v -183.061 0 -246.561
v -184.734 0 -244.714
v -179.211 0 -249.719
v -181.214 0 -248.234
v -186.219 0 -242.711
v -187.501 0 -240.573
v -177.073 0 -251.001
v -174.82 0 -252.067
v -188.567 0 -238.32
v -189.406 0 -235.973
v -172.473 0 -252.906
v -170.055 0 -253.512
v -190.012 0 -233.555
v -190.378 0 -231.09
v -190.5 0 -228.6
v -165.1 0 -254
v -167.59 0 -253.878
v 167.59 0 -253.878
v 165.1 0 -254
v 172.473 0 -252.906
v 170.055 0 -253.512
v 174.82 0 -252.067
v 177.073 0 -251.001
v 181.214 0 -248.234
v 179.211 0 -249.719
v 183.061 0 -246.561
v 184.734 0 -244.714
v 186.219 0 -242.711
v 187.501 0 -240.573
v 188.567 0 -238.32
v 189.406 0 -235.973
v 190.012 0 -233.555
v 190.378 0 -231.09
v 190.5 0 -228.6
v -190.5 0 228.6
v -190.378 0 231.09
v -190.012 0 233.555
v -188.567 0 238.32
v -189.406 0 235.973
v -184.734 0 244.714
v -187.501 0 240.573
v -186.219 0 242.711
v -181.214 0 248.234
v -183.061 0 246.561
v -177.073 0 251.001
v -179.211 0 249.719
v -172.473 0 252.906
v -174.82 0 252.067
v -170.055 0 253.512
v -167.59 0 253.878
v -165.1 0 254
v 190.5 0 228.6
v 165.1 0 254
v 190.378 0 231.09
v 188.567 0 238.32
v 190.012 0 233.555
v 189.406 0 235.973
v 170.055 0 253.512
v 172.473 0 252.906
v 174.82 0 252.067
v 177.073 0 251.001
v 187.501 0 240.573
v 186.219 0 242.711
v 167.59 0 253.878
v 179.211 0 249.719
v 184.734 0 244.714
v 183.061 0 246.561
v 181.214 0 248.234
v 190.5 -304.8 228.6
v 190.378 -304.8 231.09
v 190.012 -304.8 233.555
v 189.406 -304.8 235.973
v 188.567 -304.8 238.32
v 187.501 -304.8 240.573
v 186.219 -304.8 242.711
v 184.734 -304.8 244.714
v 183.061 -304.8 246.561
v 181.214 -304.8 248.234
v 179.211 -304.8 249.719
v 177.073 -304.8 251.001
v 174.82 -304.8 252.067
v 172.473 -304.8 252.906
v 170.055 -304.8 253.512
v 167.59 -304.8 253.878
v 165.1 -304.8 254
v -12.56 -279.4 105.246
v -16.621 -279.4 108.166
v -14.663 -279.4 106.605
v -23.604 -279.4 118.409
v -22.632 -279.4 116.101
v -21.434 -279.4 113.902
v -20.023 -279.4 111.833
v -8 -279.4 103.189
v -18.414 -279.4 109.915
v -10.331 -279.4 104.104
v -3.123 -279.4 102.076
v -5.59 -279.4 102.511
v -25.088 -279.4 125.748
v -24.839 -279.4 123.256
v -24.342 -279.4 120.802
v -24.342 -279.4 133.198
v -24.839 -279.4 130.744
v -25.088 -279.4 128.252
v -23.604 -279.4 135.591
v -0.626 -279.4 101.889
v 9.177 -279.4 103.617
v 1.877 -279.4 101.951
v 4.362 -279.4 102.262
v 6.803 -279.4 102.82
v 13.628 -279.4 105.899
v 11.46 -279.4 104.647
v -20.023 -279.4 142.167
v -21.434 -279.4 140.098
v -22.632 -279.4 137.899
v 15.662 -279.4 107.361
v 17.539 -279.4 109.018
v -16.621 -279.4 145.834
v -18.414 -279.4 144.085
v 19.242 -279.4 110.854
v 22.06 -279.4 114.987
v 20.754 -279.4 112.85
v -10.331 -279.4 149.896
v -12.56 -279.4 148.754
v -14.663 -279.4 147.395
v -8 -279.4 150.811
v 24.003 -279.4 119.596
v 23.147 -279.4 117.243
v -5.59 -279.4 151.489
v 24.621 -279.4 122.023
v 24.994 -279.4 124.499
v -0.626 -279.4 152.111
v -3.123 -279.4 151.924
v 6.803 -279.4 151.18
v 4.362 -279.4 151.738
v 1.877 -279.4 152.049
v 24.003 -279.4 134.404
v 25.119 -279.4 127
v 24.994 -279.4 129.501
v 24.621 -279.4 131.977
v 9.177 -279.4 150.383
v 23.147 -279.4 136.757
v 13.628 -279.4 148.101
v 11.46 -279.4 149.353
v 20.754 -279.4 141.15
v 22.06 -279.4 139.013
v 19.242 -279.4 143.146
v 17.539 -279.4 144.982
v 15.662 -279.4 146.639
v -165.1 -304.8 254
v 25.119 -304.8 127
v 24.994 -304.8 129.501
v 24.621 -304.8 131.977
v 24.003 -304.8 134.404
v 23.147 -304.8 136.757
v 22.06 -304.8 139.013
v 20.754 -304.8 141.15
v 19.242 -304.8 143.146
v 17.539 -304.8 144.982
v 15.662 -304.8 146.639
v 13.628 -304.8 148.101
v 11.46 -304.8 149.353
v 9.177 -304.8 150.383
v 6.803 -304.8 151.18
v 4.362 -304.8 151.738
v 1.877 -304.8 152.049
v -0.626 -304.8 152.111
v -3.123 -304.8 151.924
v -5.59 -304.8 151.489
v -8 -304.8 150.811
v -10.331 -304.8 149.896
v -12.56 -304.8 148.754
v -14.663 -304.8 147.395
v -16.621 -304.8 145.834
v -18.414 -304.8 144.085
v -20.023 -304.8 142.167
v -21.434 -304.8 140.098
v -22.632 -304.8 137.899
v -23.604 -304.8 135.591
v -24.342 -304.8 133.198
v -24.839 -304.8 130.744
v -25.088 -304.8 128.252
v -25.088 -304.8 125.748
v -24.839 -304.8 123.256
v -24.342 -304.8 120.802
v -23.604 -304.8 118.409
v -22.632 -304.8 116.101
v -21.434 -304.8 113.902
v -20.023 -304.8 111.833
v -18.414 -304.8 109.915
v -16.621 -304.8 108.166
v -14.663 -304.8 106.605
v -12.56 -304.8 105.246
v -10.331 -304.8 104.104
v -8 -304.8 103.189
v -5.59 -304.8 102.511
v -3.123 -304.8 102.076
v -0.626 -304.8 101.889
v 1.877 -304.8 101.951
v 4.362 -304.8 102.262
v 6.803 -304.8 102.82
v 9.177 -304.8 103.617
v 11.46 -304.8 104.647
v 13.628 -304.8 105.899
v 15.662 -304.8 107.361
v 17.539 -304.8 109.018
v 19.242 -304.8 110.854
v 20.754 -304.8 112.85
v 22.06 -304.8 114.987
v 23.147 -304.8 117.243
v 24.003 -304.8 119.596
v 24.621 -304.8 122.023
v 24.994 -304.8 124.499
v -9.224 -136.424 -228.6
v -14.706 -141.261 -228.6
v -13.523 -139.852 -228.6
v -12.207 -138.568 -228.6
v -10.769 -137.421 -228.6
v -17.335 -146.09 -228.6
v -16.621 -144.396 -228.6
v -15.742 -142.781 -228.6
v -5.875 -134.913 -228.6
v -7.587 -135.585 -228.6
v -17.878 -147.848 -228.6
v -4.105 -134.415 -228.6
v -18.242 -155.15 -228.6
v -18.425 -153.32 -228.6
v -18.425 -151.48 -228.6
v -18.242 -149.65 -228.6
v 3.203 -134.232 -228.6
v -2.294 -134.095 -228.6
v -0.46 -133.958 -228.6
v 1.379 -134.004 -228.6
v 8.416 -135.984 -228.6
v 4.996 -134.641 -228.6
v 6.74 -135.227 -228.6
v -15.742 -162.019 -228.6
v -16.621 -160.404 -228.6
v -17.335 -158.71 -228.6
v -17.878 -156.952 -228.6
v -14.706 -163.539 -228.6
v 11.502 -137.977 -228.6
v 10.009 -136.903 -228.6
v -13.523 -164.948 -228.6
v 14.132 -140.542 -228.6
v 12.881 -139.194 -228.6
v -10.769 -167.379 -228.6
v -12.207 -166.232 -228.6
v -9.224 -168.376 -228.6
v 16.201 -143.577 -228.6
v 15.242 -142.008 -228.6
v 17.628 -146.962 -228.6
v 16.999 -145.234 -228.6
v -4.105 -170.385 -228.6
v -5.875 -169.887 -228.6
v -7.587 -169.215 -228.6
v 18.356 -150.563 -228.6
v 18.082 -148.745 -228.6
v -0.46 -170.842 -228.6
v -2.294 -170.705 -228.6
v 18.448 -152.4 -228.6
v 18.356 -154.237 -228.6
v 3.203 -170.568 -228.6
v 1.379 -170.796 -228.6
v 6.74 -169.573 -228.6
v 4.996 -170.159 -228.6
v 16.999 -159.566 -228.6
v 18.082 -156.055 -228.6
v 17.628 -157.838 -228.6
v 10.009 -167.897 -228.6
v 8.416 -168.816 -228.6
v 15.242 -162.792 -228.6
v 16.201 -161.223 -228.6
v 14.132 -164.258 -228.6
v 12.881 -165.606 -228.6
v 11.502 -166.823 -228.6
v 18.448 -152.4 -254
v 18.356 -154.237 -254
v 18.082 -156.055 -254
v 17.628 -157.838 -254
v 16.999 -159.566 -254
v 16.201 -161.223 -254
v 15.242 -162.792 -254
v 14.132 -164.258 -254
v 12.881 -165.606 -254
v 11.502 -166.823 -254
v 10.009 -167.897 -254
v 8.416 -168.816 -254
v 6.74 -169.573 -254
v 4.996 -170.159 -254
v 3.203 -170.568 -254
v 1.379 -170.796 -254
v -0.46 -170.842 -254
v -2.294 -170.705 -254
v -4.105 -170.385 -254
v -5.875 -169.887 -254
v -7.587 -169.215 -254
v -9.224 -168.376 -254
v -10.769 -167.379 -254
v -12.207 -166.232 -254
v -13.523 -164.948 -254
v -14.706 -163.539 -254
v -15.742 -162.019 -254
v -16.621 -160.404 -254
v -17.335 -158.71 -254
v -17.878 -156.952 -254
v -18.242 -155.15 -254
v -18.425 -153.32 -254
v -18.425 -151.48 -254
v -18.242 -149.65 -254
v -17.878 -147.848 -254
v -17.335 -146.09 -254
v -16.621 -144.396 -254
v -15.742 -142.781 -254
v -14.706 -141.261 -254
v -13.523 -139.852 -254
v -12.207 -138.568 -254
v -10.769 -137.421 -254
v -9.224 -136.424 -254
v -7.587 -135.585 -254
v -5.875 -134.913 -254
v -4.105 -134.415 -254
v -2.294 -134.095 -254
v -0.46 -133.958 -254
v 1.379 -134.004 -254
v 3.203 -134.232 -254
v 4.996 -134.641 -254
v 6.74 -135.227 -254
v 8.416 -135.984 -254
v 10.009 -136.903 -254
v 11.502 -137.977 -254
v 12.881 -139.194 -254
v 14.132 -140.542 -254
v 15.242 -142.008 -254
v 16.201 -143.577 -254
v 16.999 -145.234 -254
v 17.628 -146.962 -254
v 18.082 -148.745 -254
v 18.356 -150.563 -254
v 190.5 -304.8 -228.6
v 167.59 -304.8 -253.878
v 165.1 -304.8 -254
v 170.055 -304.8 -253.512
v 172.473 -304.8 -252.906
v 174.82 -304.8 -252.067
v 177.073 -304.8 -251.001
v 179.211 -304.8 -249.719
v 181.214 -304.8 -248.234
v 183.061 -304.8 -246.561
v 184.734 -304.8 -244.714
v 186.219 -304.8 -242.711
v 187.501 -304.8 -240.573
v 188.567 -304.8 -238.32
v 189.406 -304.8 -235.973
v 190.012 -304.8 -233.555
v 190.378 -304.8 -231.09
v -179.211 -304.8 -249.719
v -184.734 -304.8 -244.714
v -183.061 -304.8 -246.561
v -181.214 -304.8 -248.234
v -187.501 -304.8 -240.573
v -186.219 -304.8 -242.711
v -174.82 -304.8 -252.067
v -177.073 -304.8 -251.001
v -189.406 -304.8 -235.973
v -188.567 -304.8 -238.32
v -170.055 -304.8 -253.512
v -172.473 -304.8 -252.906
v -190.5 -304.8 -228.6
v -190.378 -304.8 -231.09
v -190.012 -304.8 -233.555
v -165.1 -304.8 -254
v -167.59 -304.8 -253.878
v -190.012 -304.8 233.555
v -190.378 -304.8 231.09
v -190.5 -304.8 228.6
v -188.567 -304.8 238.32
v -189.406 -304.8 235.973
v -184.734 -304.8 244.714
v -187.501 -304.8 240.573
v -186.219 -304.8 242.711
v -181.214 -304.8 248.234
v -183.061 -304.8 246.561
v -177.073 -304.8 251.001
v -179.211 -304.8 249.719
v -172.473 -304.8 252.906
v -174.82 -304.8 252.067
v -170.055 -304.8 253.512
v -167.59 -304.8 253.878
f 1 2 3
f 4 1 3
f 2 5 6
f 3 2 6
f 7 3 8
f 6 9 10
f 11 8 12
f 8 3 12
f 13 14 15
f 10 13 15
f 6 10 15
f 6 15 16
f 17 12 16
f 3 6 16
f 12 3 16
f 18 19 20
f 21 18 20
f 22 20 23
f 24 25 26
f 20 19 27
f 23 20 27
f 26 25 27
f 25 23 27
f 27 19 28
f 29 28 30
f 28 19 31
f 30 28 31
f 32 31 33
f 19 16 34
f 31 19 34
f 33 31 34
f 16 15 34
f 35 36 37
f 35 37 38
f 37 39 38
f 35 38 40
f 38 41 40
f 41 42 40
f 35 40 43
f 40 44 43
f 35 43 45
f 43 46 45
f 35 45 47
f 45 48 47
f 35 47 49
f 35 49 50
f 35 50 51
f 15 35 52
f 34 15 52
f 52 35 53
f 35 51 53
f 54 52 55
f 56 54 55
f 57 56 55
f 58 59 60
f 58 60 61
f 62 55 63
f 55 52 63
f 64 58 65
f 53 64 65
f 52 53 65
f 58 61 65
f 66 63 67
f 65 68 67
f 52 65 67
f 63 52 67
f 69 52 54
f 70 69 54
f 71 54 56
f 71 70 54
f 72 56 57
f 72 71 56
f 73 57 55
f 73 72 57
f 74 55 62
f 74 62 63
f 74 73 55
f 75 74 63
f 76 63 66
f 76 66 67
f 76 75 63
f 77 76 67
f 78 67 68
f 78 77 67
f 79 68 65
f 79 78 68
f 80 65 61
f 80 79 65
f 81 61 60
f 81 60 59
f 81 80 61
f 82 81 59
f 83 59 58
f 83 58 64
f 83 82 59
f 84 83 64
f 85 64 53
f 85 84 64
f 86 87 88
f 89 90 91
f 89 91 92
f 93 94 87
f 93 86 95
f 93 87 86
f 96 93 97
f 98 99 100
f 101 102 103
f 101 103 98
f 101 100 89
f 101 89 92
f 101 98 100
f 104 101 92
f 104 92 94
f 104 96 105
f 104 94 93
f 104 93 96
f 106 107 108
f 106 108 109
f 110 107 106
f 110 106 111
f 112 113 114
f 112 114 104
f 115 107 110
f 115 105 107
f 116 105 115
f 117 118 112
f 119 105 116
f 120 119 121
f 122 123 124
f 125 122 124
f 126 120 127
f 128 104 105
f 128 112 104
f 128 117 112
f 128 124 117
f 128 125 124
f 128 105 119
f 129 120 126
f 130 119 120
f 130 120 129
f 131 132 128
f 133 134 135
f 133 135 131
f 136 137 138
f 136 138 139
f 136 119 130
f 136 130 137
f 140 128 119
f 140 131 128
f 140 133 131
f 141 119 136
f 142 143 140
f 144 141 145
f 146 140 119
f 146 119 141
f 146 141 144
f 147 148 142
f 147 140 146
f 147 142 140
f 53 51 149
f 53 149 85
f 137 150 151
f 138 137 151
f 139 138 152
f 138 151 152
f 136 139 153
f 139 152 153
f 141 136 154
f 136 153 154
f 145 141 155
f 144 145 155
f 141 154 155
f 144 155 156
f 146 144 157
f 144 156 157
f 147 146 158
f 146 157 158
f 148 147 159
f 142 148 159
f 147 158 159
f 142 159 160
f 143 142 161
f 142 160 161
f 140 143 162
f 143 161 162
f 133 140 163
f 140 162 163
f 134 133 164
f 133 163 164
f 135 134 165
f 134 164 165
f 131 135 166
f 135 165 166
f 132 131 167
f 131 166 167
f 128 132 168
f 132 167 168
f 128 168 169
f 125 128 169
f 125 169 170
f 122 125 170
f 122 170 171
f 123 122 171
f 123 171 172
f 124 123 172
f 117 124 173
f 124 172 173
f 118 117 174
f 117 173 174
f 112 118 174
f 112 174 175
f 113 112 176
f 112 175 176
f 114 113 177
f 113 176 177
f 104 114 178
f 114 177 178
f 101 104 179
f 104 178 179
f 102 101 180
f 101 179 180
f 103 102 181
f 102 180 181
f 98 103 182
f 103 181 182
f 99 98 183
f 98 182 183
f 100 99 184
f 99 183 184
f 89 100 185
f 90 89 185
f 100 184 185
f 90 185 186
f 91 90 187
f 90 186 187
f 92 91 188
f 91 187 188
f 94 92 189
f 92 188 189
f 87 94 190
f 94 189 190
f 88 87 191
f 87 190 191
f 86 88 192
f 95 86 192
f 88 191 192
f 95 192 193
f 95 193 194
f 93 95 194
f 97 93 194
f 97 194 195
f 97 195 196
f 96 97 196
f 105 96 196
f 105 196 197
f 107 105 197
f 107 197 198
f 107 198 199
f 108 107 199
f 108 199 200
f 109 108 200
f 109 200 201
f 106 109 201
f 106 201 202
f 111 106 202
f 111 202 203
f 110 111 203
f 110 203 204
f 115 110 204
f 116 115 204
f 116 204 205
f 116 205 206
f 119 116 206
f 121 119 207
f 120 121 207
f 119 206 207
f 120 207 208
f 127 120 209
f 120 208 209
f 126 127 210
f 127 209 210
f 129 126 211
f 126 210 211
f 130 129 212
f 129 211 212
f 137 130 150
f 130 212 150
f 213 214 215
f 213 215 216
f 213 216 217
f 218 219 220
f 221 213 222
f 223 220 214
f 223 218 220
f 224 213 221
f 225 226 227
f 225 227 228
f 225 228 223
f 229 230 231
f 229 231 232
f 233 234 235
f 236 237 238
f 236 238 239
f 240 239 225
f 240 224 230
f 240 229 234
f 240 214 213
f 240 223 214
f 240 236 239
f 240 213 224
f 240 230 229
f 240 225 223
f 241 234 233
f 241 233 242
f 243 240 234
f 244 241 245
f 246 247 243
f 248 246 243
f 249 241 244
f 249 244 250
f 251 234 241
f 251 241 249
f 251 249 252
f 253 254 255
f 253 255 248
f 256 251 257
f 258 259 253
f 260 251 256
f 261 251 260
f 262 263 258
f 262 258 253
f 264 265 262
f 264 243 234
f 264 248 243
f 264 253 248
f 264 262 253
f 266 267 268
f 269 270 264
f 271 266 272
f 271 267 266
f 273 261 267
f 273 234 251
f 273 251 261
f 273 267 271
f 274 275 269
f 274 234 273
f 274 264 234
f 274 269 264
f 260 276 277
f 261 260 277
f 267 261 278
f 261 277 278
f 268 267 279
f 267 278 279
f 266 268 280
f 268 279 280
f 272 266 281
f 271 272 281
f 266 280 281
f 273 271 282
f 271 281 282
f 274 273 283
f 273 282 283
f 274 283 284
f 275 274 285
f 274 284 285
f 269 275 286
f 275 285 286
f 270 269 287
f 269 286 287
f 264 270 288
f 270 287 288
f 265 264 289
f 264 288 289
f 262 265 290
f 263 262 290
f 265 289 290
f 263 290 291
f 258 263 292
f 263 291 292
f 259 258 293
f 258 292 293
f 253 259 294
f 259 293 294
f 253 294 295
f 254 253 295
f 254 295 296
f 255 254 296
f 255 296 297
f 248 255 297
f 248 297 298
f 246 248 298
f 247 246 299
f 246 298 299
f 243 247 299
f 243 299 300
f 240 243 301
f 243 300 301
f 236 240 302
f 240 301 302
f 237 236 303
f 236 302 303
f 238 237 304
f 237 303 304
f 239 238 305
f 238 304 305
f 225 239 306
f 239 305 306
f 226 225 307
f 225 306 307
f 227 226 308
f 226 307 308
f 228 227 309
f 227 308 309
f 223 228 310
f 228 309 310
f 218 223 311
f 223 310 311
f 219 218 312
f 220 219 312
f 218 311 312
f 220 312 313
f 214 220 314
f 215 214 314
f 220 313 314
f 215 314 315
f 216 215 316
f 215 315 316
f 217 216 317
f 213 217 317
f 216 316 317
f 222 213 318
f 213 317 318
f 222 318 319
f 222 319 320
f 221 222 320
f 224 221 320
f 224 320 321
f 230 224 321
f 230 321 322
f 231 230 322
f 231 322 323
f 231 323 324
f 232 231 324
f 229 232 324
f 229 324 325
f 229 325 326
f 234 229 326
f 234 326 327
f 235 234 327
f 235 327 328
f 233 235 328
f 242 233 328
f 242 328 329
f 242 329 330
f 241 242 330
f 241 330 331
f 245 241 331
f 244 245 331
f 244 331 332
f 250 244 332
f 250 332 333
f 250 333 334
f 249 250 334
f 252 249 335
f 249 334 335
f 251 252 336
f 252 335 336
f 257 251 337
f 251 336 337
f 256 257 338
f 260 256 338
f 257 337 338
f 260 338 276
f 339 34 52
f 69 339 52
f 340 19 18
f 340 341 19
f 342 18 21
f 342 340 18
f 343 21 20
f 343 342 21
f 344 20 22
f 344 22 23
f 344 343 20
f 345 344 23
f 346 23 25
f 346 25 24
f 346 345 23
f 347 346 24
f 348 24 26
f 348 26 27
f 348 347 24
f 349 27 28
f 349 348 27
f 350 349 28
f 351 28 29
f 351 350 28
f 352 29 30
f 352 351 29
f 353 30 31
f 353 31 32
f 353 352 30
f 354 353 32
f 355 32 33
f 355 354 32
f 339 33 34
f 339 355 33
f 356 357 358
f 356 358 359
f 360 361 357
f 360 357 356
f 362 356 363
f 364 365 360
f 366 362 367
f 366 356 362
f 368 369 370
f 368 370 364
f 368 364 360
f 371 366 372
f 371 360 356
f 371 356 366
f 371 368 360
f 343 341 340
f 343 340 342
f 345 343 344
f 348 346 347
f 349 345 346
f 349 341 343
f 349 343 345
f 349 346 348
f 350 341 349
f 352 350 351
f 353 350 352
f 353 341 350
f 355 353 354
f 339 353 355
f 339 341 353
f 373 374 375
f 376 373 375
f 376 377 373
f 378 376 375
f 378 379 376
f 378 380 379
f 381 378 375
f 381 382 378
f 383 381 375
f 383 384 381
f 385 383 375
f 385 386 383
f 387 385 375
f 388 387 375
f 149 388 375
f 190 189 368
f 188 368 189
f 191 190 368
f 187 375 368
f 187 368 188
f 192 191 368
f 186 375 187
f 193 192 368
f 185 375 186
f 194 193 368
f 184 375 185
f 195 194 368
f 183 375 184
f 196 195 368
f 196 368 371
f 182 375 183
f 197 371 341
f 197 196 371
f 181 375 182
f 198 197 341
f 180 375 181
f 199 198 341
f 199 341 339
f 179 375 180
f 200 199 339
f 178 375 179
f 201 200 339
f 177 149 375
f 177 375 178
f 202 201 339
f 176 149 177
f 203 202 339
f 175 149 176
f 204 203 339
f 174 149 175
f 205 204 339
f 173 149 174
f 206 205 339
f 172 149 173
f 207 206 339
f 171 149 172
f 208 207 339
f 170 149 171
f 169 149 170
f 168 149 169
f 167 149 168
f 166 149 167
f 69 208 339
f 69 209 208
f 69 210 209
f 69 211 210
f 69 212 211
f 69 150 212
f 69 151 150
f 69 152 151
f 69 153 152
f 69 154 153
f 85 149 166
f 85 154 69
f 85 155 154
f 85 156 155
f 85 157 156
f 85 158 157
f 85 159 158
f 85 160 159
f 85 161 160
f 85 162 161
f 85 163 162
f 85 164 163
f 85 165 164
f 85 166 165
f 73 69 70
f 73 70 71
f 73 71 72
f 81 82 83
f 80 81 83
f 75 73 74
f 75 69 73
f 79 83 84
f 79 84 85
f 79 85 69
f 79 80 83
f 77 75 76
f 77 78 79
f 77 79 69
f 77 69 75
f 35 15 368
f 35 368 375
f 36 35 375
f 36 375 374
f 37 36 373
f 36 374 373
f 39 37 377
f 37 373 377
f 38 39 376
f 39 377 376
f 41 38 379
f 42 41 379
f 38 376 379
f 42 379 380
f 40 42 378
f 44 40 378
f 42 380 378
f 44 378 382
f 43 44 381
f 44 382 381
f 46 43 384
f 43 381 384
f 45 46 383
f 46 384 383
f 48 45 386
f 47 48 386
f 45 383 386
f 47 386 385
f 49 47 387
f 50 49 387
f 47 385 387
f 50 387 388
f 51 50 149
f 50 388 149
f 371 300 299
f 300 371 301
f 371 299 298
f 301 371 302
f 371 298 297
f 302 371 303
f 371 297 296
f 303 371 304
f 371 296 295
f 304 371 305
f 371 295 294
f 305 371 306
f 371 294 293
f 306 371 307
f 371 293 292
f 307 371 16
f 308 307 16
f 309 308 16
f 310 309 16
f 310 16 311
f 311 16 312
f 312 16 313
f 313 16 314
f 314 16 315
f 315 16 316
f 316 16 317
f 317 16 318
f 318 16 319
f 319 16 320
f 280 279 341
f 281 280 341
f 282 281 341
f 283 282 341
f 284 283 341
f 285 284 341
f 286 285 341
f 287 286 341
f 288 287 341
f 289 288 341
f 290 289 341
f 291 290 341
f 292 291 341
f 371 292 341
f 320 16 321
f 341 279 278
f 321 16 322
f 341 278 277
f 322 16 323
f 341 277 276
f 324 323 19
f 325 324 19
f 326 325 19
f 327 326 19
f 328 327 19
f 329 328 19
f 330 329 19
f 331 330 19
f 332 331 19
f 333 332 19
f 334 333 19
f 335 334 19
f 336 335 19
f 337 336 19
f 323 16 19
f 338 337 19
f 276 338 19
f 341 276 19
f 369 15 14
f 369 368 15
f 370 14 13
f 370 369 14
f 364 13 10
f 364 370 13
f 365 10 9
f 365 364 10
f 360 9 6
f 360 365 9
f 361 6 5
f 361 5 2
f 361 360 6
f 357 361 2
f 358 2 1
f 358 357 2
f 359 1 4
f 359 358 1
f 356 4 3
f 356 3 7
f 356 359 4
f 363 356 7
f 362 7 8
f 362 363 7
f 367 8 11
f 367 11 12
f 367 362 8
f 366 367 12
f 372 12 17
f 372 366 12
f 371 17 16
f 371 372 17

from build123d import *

# Parameters (mm, degrees)
F0_W     = 381
F0_H     = 508
F1_DEPTH = 304.8
F2_R     = 25.4
F3_R     = 18.448016
F4_DEPTH = 25.4
F6_R     = 25.119242
F7_DEPTH = 25.4


with BuildPart() as f1:
    # F0 (on Front) → F1 (new body)
    with BuildSketch(Plane.XZ):
        Rectangle(F0_W, F0_H)
    extrude(amount=F1_DEPTH)

    # F2
    f2_edges = [f1.edges().sort_by_distance(p)[0] for p in [
        (-190.5, -152.4, 254),
        (190.5, -152.4, 254),
        (190.5, -152.4, -254),
        (-190.5, -152.4, -254),
    ]]
    fillet(f2_edges, radius=F2_R)

    # F3 (on face) → F4 (cut)
    with BuildSketch(Plane(origin=(0, 0, -254), x_dir=(1, 0, 0), z_dir=(0, 0, -1))):
        with Locations((0, 152.4)):
            Circle(F3_R)
    extrude(amount=-F4_DEPTH, mode=Mode.SUBTRACT)

    # F6 (on face) → F7 (cut)
    with BuildSketch(Plane.XZ.offset(304.8)):
        with Locations((0, 127)):
            Circle(F6_R)
    extrude(amount=-F7_DEPTH, mode=Mode.SUBTRACT)


solid = f1.part
